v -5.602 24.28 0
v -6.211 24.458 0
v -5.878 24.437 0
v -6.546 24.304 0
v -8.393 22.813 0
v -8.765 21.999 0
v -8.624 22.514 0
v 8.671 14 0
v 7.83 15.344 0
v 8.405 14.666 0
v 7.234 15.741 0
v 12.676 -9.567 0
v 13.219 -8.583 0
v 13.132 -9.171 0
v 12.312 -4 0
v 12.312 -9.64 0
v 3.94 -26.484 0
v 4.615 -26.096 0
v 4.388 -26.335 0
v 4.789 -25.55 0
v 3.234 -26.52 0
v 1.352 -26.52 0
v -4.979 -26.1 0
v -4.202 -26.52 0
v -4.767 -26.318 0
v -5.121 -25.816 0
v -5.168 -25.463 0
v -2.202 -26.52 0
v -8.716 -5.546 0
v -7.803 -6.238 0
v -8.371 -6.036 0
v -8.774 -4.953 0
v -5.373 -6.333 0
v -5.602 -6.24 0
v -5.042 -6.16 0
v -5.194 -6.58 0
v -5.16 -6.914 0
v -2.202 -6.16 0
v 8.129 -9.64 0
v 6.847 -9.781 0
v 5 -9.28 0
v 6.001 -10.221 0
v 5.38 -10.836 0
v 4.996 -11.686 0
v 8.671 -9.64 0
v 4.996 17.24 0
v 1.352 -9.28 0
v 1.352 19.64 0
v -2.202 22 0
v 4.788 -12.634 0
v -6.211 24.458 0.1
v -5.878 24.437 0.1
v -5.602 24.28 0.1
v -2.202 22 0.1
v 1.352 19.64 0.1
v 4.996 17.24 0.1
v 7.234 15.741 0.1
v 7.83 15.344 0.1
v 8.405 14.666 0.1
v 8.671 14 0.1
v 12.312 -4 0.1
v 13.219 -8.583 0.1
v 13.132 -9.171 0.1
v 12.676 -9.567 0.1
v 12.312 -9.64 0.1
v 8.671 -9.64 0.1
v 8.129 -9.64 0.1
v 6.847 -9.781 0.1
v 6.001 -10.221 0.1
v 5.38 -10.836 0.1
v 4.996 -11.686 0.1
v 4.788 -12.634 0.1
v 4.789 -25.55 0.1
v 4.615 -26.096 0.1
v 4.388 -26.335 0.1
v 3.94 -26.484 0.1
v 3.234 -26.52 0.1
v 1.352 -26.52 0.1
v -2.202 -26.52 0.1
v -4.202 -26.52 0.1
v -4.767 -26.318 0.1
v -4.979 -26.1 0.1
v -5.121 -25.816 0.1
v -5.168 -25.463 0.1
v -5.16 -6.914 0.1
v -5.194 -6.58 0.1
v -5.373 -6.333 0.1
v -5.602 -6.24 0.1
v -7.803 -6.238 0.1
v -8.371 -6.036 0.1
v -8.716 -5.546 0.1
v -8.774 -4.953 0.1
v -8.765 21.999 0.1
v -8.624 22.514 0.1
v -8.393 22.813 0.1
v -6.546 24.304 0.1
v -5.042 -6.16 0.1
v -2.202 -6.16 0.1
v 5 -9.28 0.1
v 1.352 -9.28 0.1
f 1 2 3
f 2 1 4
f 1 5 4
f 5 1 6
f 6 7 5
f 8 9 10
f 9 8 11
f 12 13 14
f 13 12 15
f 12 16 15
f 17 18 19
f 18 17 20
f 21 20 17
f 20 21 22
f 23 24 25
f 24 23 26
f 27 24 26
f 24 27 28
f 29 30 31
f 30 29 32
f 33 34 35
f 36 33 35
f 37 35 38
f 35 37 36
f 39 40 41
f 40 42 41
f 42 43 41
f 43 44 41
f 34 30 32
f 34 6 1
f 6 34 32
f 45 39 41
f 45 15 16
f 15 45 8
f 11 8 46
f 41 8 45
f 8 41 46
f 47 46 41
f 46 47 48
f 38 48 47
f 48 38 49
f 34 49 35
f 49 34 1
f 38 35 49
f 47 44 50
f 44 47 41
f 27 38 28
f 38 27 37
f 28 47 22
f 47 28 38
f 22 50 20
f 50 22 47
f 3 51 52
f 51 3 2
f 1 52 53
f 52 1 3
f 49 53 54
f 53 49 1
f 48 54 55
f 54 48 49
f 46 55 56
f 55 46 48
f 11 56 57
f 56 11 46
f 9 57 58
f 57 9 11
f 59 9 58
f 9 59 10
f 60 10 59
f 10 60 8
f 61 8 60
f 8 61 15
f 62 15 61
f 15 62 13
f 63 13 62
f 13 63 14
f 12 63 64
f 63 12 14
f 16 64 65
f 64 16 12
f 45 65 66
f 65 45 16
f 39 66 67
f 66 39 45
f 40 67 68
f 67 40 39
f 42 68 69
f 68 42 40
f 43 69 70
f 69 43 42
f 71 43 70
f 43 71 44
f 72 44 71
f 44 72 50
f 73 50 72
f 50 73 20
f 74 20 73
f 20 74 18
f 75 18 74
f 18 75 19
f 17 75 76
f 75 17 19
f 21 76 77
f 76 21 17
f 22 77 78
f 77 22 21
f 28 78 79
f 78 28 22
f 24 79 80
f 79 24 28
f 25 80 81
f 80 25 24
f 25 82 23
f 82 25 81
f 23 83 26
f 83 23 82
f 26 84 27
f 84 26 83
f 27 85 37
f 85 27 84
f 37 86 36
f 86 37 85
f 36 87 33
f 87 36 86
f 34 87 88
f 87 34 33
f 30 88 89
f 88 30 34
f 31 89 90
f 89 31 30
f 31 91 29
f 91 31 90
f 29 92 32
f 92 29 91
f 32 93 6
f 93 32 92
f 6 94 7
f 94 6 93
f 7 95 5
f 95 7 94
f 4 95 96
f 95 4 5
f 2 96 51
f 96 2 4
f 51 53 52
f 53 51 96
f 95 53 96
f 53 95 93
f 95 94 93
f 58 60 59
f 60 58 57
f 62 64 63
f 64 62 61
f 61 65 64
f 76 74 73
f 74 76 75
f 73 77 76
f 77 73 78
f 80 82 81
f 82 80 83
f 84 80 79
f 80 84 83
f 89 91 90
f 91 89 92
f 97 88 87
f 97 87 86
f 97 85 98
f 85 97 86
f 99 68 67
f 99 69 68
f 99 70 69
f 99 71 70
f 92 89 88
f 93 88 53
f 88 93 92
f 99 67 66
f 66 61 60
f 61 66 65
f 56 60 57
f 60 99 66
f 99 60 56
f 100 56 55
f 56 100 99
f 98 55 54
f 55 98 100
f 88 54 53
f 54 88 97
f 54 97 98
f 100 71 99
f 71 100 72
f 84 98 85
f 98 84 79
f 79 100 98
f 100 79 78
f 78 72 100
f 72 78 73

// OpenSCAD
// file: s/13710as02.scad
use <../../lib.scad>
function ldraw_lib__s__13710as02() = [
// 0 ~Sticker Top for Technic Panel Fairing Smooth (Medium) Flat
// 0 Name: s\13710as02.dat
// 0 Author: Philippe Hurbain [Philo]
// 0 !LDRAW_ORG Subpart UPDATE 2022-02
// 0 !LICENSE Licensed under CC BY 2.0 and CC BY 4.0 : see CAreadme.txt
// 
// 0 BFC CERTIFY CCW
  [0,"BFC","CERTIFY"],
  [0,"BFC","CCW"],
// 
// 0 !HISTORY 2022-03-06 [PTadmin] Official Update 2022-02
// 
// 
// 0 // Top surface
// 4 16 16.364 -0.25 60.759 15.527 -0.25 61.145 14.695 -0.25 61.093 14.004 -0.25 60.7
  [4,16,16.364,-0.25,60.759,15.527,-0.25,61.145,14.695,-0.25,61.093,14.004,-0.25,60.7],
// 4 16 21.912 -0.25 54.998 20.983 -0.25 57.032 16.364 -0.25 60.759 14.004 -0.25 60.7
  [4,16,21.912,-0.25,54.998,20.983,-0.25,57.032,16.364,-0.25,60.759,14.004,-0.25,60.7],
// 3 16 21.912 -0.25 54.998 21.561 -0.25 56.284 20.983 -0.25 57.032
  [3,16,21.912,-0.25,54.998,21.561,-0.25,56.284,20.983,-0.25,57.032],
// 4 16 -18.084 -0.25 39.353 -19.575 -0.25 38.36 -21.013 -0.25 36.664 -21.677 -0.25 35
  [4,16,-18.084,-0.25,39.353,-19.575,-0.25,38.36,-21.013,-0.25,36.664,-21.677,-0.25,35],
// 4 16 -31.689 -0.25 -23.918 -30.78 -0.25 -10 -33.048 -0.25 -21.458 -32.83 -0.25 -22.928
  [4,16,-31.689,-0.25,-23.918,-30.78,-0.25,-10,-33.048,-0.25,-21.458,-32.83,-0.25,-22.928],
// 3 16 -31.689 -0.25 -23.918 -30.78 -0.25 -24.1 -30.78 -0.25 -10
  [3,16,-31.689,-0.25,-23.918,-30.78,-0.25,-24.1,-30.78,-0.25,-10],
// 4 16 -9.849 -0.25 -66.209 -11.972 -0.25 -63.874 -11.537 -0.25 -65.239 -10.971 -0.25 -65.837
  [4,16,-9.849,-0.25,-66.209,-11.972,-0.25,-63.874,-11.537,-0.25,-65.239,-10.971,-0.25,-65.837],
// 4 16 -3.379 -0.25 -66.3 -11.972 -0.25 -63.874 -9.849 -0.25 -66.209 -8.084 -0.25 -66.3
  [4,16,-3.379,-0.25,-66.3,-11.972,-0.25,-63.874,-9.849,-0.25,-66.209,-8.084,-0.25,-66.3],
// 4 16 12.802 -0.25 -64.539 10.504 -0.25 -66.3 11.917 -0.25 -65.795 12.448 -0.25 -65.249
  [4,16,12.802,-0.25,-64.539,10.504,-0.25,-66.3,11.917,-0.25,-65.795,12.448,-0.25,-65.249],
// 4 16 5.504 -0.25 -66.3 10.504 -0.25 -66.3 12.802 -0.25 -64.539 12.92 -0.25 -63.658
  [4,16,5.504,-0.25,-66.3,10.504,-0.25,-66.3,12.802,-0.25,-64.539,12.92,-0.25,-63.658],
// 4 16 19.507 -0.25 -15.595 20.928 -0.25 -15.089 21.79 -0.25 -13.866 21.935 -0.25 -12.382
  [4,16,19.507,-0.25,-15.595,20.928,-0.25,-15.089,21.79,-0.25,-13.866,21.935,-0.25,-12.382],
// 3 16 13.432 -0.25 -15.832 14.004 -0.25 -15.6 12.604 -0.25 -15.4
  [3,16,13.432,-0.25,-15.832,14.004,-0.25,-15.6,12.604,-0.25,-15.4],
// 3 16 12.984 -0.25 -16.45 13.432 -0.25 -15.832 12.604 -0.25 -15.4
  [3,16,12.984,-0.25,-16.45,13.432,-0.25,-15.832,12.604,-0.25,-15.4],
// 4 16 5.504 -0.25 -15.4 12.899 -0.25 -17.286 12.984 -0.25 -16.45 12.604 -0.25 -15.4
  [4,16,5.504,-0.25,-15.4,12.899,-0.25,-17.286,12.984,-0.25,-16.45,12.604,-0.25,-15.4],
// 3 16 -20.323 -0.25 -24.1 -17.118 -0.25 -24.453 -12.5 -0.25 -23.2
  [3,16,-20.323,-0.25,-24.1,-17.118,-0.25,-24.453,-12.5,-0.25,-23.2],
// 3 16 -17.118 -0.25 -24.453 -15.003 -0.25 -25.552 -12.5 -0.25 -23.2
  [3,16,-17.118,-0.25,-24.453,-15.003,-0.25,-25.552,-12.5,-0.25,-23.2],
// 3 16 -15.003 -0.25 -25.552 -13.45 -0.25 -27.089 -12.5 -0.25 -23.2
  [3,16,-15.003,-0.25,-25.552,-13.45,-0.25,-27.089,-12.5,-0.25,-23.2],
// 3 16 -13.45 -0.25 -27.089 -12.491 -0.25 -29.214 -12.5 -0.25 -23.2
  [3,16,-13.45,-0.25,-27.089,-12.491,-0.25,-29.214,-12.5,-0.25,-23.2],
// 3 16 14.004 -0.25 -15.6 19.507 -0.25 -15.595 21.935 -0.25 -12.382
  [3,16,14.004,-0.25,-15.6,19.507,-0.25,-15.595,21.935,-0.25,-12.382],
// 4 16 14.004 -0.25 60.7 14.004 -0.25 -15.6 21.935 -0.25 -12.382 21.912 -0.25 54.998
  [4,16,14.004,-0.25,60.7,14.004,-0.25,-15.6,21.935,-0.25,-12.382,21.912,-0.25,54.998],
// 3 16 -21.677 -0.25 -24.1 -20.323 -0.25 -24.1 -12.5 -0.25 -23.2
  [3,16,-21.677,-0.25,-24.1,-20.323,-0.25,-24.1,-12.5,-0.25,-23.2],
// 4 16 -30.78 -0.25 -24.1 -21.677 -0.25 -24.1 -21.677 -0.25 35 -30.78 -0.25 -10
  [4,16,-30.78,-0.25,-24.1,-21.677,-0.25,-24.1,-21.677,-0.25,35,-30.78,-0.25,-10],
// 3 16 -18.084 -0.25 39.353 -21.677 -0.25 35 -12.491 -0.25 43.1
  [3,16,-18.084,-0.25,39.353,-21.677,-0.25,35,-12.491,-0.25,43.1],
// 4 16 -21.677 -0.25 35 -21.677 -0.25 -24.1 -12.5 -0.25 -23.2 -12.491 -0.25 43.1
  [4,16,-21.677,-0.25,35,-21.677,-0.25,-24.1,-12.5,-0.25,-23.2,-12.491,-0.25,43.1],
// 4 16 -12.5 -0.25 -23.2 -3.379 -0.25 -23.2 -3.379 -0.25 49.1 -12.491 -0.25 43.1
  [4,16,-12.5,-0.25,-23.2,-3.379,-0.25,-23.2,-3.379,-0.25,49.1,-12.491,-0.25,43.1],
// 4 16 -3.379 -0.25 -23.2 5.504 -0.25 -15.4 5.504 -0.25 55 -3.379 -0.25 49.1
  [4,16,-3.379,-0.25,-23.2,5.504,-0.25,-15.4,5.504,-0.25,55,-3.379,-0.25,49.1],
// 4 16 14.004 -0.25 60.7 5.504 -0.25 55 12.604 -0.25 -15.4 14.004 -0.25 -15.6
  [4,16,14.004,-0.25,60.7,5.504,-0.25,55,12.604,-0.25,-15.4,14.004,-0.25,-15.6],
// 3 16 5.504 -0.25 -15.4 12.604 -0.25 -15.4 5.504 -0.25 55
  [3,16,5.504,-0.25,-15.4,12.604,-0.25,-15.4,5.504,-0.25,55],
// 4 16 -11.97 -0.25 -31.586 -3.379 -0.25 -23.2 -12.5 -0.25 -23.2 -12.491 -0.25 -29.214
  [4,16,-11.97,-0.25,-31.586,-3.379,-0.25,-23.2,-12.5,-0.25,-23.2,-12.491,-0.25,-29.214],
// 4 16 5.504 -0.25 -66.3 12.92 -0.25 -63.658 12.899 -0.25 -17.286 5.504 -0.25 -15.4
  [4,16,5.504,-0.25,-66.3,12.92,-0.25,-63.658,12.899,-0.25,-17.286,5.504,-0.25,-15.4],
// 4 16 -3.379 -0.25 -66.3 5.504 -0.25 -66.3 5.504 -0.25 -15.4 -3.379 -0.25 -23.2
  [4,16,-3.379,-0.25,-66.3,5.504,-0.25,-66.3,5.504,-0.25,-15.4,-3.379,-0.25,-23.2],
// 4 16 -11.972 -0.25 -63.874 -3.379 -0.25 -66.3 -3.379 -0.25 -23.2 -11.97 -0.25 -31.586
  [4,16,-11.972,-0.25,-63.874,-3.379,-0.25,-66.3,-3.379,-0.25,-23.2,-11.97,-0.25,-31.586],
];
makepoly(ldraw_lib__s__13710as02(), line=0.2);
// main file
use <../lib.scad>
use <s/13710as01.scad>
use <s/13710as02.scad>
function ldraw_lib__13710d() = [
// 0 Sticker Mindstorms EV3 #4 for Panel Smooth Medium (Needs Work)
// 0 Name: 13710d.dat
// 0 Author: Philippe Hurbain [Philo]
// 0 !LDRAW_ORG Part UPDATE 2022-02
// 0 !LICENSE Licensed under CC BY 2.0 and CC BY 4.0 : see CAreadme.txt
// 
// 0 !HELP To be used with panel 64391
// 
// 0 BFC CERTIFY CCW
  [0,"BFC","CERTIFY"],
  [0,"BFC","CCW"],
// 
// 0 !HISTORY 2022-03-06 [PTadmin] Official Update 2022-02
// 
// 
// 0 // Image file courtesy of the LEGO MINDSTORMS Team
// 0 // Needs Work: Missing more detailed fallback pattern
// 
// 1 16 0 0 0 -1 0 0 0 1 0 0 0 1 s\13710as01.dat
  [1,16,0,0,0,-1,0,0,0,1,0,0,0,1, ldraw_lib__s__13710as01()],
// 0 !TEXMAP START PLANAR 33.048 0 61.145 33.048 0 -66.3 -21.935 0 61.145 13710d.png
// 0 !: 1 15 0 0 0 -1 0 0 0 1 0 0 0 1 s\13710as02.dat
// 0 !TEXMAP FALLBACK
// 1 15 0 0 0 -1 0 0 0 1 0 0 0 1 s\13710as02.dat
  [1,15,0,0,0,-1,0,0,0,1,0,0,0,1, ldraw_lib__s__13710as02()],
// 0 !TEXMAP END
];
makepoly(ldraw_lib__13710d(), line=0.2);
